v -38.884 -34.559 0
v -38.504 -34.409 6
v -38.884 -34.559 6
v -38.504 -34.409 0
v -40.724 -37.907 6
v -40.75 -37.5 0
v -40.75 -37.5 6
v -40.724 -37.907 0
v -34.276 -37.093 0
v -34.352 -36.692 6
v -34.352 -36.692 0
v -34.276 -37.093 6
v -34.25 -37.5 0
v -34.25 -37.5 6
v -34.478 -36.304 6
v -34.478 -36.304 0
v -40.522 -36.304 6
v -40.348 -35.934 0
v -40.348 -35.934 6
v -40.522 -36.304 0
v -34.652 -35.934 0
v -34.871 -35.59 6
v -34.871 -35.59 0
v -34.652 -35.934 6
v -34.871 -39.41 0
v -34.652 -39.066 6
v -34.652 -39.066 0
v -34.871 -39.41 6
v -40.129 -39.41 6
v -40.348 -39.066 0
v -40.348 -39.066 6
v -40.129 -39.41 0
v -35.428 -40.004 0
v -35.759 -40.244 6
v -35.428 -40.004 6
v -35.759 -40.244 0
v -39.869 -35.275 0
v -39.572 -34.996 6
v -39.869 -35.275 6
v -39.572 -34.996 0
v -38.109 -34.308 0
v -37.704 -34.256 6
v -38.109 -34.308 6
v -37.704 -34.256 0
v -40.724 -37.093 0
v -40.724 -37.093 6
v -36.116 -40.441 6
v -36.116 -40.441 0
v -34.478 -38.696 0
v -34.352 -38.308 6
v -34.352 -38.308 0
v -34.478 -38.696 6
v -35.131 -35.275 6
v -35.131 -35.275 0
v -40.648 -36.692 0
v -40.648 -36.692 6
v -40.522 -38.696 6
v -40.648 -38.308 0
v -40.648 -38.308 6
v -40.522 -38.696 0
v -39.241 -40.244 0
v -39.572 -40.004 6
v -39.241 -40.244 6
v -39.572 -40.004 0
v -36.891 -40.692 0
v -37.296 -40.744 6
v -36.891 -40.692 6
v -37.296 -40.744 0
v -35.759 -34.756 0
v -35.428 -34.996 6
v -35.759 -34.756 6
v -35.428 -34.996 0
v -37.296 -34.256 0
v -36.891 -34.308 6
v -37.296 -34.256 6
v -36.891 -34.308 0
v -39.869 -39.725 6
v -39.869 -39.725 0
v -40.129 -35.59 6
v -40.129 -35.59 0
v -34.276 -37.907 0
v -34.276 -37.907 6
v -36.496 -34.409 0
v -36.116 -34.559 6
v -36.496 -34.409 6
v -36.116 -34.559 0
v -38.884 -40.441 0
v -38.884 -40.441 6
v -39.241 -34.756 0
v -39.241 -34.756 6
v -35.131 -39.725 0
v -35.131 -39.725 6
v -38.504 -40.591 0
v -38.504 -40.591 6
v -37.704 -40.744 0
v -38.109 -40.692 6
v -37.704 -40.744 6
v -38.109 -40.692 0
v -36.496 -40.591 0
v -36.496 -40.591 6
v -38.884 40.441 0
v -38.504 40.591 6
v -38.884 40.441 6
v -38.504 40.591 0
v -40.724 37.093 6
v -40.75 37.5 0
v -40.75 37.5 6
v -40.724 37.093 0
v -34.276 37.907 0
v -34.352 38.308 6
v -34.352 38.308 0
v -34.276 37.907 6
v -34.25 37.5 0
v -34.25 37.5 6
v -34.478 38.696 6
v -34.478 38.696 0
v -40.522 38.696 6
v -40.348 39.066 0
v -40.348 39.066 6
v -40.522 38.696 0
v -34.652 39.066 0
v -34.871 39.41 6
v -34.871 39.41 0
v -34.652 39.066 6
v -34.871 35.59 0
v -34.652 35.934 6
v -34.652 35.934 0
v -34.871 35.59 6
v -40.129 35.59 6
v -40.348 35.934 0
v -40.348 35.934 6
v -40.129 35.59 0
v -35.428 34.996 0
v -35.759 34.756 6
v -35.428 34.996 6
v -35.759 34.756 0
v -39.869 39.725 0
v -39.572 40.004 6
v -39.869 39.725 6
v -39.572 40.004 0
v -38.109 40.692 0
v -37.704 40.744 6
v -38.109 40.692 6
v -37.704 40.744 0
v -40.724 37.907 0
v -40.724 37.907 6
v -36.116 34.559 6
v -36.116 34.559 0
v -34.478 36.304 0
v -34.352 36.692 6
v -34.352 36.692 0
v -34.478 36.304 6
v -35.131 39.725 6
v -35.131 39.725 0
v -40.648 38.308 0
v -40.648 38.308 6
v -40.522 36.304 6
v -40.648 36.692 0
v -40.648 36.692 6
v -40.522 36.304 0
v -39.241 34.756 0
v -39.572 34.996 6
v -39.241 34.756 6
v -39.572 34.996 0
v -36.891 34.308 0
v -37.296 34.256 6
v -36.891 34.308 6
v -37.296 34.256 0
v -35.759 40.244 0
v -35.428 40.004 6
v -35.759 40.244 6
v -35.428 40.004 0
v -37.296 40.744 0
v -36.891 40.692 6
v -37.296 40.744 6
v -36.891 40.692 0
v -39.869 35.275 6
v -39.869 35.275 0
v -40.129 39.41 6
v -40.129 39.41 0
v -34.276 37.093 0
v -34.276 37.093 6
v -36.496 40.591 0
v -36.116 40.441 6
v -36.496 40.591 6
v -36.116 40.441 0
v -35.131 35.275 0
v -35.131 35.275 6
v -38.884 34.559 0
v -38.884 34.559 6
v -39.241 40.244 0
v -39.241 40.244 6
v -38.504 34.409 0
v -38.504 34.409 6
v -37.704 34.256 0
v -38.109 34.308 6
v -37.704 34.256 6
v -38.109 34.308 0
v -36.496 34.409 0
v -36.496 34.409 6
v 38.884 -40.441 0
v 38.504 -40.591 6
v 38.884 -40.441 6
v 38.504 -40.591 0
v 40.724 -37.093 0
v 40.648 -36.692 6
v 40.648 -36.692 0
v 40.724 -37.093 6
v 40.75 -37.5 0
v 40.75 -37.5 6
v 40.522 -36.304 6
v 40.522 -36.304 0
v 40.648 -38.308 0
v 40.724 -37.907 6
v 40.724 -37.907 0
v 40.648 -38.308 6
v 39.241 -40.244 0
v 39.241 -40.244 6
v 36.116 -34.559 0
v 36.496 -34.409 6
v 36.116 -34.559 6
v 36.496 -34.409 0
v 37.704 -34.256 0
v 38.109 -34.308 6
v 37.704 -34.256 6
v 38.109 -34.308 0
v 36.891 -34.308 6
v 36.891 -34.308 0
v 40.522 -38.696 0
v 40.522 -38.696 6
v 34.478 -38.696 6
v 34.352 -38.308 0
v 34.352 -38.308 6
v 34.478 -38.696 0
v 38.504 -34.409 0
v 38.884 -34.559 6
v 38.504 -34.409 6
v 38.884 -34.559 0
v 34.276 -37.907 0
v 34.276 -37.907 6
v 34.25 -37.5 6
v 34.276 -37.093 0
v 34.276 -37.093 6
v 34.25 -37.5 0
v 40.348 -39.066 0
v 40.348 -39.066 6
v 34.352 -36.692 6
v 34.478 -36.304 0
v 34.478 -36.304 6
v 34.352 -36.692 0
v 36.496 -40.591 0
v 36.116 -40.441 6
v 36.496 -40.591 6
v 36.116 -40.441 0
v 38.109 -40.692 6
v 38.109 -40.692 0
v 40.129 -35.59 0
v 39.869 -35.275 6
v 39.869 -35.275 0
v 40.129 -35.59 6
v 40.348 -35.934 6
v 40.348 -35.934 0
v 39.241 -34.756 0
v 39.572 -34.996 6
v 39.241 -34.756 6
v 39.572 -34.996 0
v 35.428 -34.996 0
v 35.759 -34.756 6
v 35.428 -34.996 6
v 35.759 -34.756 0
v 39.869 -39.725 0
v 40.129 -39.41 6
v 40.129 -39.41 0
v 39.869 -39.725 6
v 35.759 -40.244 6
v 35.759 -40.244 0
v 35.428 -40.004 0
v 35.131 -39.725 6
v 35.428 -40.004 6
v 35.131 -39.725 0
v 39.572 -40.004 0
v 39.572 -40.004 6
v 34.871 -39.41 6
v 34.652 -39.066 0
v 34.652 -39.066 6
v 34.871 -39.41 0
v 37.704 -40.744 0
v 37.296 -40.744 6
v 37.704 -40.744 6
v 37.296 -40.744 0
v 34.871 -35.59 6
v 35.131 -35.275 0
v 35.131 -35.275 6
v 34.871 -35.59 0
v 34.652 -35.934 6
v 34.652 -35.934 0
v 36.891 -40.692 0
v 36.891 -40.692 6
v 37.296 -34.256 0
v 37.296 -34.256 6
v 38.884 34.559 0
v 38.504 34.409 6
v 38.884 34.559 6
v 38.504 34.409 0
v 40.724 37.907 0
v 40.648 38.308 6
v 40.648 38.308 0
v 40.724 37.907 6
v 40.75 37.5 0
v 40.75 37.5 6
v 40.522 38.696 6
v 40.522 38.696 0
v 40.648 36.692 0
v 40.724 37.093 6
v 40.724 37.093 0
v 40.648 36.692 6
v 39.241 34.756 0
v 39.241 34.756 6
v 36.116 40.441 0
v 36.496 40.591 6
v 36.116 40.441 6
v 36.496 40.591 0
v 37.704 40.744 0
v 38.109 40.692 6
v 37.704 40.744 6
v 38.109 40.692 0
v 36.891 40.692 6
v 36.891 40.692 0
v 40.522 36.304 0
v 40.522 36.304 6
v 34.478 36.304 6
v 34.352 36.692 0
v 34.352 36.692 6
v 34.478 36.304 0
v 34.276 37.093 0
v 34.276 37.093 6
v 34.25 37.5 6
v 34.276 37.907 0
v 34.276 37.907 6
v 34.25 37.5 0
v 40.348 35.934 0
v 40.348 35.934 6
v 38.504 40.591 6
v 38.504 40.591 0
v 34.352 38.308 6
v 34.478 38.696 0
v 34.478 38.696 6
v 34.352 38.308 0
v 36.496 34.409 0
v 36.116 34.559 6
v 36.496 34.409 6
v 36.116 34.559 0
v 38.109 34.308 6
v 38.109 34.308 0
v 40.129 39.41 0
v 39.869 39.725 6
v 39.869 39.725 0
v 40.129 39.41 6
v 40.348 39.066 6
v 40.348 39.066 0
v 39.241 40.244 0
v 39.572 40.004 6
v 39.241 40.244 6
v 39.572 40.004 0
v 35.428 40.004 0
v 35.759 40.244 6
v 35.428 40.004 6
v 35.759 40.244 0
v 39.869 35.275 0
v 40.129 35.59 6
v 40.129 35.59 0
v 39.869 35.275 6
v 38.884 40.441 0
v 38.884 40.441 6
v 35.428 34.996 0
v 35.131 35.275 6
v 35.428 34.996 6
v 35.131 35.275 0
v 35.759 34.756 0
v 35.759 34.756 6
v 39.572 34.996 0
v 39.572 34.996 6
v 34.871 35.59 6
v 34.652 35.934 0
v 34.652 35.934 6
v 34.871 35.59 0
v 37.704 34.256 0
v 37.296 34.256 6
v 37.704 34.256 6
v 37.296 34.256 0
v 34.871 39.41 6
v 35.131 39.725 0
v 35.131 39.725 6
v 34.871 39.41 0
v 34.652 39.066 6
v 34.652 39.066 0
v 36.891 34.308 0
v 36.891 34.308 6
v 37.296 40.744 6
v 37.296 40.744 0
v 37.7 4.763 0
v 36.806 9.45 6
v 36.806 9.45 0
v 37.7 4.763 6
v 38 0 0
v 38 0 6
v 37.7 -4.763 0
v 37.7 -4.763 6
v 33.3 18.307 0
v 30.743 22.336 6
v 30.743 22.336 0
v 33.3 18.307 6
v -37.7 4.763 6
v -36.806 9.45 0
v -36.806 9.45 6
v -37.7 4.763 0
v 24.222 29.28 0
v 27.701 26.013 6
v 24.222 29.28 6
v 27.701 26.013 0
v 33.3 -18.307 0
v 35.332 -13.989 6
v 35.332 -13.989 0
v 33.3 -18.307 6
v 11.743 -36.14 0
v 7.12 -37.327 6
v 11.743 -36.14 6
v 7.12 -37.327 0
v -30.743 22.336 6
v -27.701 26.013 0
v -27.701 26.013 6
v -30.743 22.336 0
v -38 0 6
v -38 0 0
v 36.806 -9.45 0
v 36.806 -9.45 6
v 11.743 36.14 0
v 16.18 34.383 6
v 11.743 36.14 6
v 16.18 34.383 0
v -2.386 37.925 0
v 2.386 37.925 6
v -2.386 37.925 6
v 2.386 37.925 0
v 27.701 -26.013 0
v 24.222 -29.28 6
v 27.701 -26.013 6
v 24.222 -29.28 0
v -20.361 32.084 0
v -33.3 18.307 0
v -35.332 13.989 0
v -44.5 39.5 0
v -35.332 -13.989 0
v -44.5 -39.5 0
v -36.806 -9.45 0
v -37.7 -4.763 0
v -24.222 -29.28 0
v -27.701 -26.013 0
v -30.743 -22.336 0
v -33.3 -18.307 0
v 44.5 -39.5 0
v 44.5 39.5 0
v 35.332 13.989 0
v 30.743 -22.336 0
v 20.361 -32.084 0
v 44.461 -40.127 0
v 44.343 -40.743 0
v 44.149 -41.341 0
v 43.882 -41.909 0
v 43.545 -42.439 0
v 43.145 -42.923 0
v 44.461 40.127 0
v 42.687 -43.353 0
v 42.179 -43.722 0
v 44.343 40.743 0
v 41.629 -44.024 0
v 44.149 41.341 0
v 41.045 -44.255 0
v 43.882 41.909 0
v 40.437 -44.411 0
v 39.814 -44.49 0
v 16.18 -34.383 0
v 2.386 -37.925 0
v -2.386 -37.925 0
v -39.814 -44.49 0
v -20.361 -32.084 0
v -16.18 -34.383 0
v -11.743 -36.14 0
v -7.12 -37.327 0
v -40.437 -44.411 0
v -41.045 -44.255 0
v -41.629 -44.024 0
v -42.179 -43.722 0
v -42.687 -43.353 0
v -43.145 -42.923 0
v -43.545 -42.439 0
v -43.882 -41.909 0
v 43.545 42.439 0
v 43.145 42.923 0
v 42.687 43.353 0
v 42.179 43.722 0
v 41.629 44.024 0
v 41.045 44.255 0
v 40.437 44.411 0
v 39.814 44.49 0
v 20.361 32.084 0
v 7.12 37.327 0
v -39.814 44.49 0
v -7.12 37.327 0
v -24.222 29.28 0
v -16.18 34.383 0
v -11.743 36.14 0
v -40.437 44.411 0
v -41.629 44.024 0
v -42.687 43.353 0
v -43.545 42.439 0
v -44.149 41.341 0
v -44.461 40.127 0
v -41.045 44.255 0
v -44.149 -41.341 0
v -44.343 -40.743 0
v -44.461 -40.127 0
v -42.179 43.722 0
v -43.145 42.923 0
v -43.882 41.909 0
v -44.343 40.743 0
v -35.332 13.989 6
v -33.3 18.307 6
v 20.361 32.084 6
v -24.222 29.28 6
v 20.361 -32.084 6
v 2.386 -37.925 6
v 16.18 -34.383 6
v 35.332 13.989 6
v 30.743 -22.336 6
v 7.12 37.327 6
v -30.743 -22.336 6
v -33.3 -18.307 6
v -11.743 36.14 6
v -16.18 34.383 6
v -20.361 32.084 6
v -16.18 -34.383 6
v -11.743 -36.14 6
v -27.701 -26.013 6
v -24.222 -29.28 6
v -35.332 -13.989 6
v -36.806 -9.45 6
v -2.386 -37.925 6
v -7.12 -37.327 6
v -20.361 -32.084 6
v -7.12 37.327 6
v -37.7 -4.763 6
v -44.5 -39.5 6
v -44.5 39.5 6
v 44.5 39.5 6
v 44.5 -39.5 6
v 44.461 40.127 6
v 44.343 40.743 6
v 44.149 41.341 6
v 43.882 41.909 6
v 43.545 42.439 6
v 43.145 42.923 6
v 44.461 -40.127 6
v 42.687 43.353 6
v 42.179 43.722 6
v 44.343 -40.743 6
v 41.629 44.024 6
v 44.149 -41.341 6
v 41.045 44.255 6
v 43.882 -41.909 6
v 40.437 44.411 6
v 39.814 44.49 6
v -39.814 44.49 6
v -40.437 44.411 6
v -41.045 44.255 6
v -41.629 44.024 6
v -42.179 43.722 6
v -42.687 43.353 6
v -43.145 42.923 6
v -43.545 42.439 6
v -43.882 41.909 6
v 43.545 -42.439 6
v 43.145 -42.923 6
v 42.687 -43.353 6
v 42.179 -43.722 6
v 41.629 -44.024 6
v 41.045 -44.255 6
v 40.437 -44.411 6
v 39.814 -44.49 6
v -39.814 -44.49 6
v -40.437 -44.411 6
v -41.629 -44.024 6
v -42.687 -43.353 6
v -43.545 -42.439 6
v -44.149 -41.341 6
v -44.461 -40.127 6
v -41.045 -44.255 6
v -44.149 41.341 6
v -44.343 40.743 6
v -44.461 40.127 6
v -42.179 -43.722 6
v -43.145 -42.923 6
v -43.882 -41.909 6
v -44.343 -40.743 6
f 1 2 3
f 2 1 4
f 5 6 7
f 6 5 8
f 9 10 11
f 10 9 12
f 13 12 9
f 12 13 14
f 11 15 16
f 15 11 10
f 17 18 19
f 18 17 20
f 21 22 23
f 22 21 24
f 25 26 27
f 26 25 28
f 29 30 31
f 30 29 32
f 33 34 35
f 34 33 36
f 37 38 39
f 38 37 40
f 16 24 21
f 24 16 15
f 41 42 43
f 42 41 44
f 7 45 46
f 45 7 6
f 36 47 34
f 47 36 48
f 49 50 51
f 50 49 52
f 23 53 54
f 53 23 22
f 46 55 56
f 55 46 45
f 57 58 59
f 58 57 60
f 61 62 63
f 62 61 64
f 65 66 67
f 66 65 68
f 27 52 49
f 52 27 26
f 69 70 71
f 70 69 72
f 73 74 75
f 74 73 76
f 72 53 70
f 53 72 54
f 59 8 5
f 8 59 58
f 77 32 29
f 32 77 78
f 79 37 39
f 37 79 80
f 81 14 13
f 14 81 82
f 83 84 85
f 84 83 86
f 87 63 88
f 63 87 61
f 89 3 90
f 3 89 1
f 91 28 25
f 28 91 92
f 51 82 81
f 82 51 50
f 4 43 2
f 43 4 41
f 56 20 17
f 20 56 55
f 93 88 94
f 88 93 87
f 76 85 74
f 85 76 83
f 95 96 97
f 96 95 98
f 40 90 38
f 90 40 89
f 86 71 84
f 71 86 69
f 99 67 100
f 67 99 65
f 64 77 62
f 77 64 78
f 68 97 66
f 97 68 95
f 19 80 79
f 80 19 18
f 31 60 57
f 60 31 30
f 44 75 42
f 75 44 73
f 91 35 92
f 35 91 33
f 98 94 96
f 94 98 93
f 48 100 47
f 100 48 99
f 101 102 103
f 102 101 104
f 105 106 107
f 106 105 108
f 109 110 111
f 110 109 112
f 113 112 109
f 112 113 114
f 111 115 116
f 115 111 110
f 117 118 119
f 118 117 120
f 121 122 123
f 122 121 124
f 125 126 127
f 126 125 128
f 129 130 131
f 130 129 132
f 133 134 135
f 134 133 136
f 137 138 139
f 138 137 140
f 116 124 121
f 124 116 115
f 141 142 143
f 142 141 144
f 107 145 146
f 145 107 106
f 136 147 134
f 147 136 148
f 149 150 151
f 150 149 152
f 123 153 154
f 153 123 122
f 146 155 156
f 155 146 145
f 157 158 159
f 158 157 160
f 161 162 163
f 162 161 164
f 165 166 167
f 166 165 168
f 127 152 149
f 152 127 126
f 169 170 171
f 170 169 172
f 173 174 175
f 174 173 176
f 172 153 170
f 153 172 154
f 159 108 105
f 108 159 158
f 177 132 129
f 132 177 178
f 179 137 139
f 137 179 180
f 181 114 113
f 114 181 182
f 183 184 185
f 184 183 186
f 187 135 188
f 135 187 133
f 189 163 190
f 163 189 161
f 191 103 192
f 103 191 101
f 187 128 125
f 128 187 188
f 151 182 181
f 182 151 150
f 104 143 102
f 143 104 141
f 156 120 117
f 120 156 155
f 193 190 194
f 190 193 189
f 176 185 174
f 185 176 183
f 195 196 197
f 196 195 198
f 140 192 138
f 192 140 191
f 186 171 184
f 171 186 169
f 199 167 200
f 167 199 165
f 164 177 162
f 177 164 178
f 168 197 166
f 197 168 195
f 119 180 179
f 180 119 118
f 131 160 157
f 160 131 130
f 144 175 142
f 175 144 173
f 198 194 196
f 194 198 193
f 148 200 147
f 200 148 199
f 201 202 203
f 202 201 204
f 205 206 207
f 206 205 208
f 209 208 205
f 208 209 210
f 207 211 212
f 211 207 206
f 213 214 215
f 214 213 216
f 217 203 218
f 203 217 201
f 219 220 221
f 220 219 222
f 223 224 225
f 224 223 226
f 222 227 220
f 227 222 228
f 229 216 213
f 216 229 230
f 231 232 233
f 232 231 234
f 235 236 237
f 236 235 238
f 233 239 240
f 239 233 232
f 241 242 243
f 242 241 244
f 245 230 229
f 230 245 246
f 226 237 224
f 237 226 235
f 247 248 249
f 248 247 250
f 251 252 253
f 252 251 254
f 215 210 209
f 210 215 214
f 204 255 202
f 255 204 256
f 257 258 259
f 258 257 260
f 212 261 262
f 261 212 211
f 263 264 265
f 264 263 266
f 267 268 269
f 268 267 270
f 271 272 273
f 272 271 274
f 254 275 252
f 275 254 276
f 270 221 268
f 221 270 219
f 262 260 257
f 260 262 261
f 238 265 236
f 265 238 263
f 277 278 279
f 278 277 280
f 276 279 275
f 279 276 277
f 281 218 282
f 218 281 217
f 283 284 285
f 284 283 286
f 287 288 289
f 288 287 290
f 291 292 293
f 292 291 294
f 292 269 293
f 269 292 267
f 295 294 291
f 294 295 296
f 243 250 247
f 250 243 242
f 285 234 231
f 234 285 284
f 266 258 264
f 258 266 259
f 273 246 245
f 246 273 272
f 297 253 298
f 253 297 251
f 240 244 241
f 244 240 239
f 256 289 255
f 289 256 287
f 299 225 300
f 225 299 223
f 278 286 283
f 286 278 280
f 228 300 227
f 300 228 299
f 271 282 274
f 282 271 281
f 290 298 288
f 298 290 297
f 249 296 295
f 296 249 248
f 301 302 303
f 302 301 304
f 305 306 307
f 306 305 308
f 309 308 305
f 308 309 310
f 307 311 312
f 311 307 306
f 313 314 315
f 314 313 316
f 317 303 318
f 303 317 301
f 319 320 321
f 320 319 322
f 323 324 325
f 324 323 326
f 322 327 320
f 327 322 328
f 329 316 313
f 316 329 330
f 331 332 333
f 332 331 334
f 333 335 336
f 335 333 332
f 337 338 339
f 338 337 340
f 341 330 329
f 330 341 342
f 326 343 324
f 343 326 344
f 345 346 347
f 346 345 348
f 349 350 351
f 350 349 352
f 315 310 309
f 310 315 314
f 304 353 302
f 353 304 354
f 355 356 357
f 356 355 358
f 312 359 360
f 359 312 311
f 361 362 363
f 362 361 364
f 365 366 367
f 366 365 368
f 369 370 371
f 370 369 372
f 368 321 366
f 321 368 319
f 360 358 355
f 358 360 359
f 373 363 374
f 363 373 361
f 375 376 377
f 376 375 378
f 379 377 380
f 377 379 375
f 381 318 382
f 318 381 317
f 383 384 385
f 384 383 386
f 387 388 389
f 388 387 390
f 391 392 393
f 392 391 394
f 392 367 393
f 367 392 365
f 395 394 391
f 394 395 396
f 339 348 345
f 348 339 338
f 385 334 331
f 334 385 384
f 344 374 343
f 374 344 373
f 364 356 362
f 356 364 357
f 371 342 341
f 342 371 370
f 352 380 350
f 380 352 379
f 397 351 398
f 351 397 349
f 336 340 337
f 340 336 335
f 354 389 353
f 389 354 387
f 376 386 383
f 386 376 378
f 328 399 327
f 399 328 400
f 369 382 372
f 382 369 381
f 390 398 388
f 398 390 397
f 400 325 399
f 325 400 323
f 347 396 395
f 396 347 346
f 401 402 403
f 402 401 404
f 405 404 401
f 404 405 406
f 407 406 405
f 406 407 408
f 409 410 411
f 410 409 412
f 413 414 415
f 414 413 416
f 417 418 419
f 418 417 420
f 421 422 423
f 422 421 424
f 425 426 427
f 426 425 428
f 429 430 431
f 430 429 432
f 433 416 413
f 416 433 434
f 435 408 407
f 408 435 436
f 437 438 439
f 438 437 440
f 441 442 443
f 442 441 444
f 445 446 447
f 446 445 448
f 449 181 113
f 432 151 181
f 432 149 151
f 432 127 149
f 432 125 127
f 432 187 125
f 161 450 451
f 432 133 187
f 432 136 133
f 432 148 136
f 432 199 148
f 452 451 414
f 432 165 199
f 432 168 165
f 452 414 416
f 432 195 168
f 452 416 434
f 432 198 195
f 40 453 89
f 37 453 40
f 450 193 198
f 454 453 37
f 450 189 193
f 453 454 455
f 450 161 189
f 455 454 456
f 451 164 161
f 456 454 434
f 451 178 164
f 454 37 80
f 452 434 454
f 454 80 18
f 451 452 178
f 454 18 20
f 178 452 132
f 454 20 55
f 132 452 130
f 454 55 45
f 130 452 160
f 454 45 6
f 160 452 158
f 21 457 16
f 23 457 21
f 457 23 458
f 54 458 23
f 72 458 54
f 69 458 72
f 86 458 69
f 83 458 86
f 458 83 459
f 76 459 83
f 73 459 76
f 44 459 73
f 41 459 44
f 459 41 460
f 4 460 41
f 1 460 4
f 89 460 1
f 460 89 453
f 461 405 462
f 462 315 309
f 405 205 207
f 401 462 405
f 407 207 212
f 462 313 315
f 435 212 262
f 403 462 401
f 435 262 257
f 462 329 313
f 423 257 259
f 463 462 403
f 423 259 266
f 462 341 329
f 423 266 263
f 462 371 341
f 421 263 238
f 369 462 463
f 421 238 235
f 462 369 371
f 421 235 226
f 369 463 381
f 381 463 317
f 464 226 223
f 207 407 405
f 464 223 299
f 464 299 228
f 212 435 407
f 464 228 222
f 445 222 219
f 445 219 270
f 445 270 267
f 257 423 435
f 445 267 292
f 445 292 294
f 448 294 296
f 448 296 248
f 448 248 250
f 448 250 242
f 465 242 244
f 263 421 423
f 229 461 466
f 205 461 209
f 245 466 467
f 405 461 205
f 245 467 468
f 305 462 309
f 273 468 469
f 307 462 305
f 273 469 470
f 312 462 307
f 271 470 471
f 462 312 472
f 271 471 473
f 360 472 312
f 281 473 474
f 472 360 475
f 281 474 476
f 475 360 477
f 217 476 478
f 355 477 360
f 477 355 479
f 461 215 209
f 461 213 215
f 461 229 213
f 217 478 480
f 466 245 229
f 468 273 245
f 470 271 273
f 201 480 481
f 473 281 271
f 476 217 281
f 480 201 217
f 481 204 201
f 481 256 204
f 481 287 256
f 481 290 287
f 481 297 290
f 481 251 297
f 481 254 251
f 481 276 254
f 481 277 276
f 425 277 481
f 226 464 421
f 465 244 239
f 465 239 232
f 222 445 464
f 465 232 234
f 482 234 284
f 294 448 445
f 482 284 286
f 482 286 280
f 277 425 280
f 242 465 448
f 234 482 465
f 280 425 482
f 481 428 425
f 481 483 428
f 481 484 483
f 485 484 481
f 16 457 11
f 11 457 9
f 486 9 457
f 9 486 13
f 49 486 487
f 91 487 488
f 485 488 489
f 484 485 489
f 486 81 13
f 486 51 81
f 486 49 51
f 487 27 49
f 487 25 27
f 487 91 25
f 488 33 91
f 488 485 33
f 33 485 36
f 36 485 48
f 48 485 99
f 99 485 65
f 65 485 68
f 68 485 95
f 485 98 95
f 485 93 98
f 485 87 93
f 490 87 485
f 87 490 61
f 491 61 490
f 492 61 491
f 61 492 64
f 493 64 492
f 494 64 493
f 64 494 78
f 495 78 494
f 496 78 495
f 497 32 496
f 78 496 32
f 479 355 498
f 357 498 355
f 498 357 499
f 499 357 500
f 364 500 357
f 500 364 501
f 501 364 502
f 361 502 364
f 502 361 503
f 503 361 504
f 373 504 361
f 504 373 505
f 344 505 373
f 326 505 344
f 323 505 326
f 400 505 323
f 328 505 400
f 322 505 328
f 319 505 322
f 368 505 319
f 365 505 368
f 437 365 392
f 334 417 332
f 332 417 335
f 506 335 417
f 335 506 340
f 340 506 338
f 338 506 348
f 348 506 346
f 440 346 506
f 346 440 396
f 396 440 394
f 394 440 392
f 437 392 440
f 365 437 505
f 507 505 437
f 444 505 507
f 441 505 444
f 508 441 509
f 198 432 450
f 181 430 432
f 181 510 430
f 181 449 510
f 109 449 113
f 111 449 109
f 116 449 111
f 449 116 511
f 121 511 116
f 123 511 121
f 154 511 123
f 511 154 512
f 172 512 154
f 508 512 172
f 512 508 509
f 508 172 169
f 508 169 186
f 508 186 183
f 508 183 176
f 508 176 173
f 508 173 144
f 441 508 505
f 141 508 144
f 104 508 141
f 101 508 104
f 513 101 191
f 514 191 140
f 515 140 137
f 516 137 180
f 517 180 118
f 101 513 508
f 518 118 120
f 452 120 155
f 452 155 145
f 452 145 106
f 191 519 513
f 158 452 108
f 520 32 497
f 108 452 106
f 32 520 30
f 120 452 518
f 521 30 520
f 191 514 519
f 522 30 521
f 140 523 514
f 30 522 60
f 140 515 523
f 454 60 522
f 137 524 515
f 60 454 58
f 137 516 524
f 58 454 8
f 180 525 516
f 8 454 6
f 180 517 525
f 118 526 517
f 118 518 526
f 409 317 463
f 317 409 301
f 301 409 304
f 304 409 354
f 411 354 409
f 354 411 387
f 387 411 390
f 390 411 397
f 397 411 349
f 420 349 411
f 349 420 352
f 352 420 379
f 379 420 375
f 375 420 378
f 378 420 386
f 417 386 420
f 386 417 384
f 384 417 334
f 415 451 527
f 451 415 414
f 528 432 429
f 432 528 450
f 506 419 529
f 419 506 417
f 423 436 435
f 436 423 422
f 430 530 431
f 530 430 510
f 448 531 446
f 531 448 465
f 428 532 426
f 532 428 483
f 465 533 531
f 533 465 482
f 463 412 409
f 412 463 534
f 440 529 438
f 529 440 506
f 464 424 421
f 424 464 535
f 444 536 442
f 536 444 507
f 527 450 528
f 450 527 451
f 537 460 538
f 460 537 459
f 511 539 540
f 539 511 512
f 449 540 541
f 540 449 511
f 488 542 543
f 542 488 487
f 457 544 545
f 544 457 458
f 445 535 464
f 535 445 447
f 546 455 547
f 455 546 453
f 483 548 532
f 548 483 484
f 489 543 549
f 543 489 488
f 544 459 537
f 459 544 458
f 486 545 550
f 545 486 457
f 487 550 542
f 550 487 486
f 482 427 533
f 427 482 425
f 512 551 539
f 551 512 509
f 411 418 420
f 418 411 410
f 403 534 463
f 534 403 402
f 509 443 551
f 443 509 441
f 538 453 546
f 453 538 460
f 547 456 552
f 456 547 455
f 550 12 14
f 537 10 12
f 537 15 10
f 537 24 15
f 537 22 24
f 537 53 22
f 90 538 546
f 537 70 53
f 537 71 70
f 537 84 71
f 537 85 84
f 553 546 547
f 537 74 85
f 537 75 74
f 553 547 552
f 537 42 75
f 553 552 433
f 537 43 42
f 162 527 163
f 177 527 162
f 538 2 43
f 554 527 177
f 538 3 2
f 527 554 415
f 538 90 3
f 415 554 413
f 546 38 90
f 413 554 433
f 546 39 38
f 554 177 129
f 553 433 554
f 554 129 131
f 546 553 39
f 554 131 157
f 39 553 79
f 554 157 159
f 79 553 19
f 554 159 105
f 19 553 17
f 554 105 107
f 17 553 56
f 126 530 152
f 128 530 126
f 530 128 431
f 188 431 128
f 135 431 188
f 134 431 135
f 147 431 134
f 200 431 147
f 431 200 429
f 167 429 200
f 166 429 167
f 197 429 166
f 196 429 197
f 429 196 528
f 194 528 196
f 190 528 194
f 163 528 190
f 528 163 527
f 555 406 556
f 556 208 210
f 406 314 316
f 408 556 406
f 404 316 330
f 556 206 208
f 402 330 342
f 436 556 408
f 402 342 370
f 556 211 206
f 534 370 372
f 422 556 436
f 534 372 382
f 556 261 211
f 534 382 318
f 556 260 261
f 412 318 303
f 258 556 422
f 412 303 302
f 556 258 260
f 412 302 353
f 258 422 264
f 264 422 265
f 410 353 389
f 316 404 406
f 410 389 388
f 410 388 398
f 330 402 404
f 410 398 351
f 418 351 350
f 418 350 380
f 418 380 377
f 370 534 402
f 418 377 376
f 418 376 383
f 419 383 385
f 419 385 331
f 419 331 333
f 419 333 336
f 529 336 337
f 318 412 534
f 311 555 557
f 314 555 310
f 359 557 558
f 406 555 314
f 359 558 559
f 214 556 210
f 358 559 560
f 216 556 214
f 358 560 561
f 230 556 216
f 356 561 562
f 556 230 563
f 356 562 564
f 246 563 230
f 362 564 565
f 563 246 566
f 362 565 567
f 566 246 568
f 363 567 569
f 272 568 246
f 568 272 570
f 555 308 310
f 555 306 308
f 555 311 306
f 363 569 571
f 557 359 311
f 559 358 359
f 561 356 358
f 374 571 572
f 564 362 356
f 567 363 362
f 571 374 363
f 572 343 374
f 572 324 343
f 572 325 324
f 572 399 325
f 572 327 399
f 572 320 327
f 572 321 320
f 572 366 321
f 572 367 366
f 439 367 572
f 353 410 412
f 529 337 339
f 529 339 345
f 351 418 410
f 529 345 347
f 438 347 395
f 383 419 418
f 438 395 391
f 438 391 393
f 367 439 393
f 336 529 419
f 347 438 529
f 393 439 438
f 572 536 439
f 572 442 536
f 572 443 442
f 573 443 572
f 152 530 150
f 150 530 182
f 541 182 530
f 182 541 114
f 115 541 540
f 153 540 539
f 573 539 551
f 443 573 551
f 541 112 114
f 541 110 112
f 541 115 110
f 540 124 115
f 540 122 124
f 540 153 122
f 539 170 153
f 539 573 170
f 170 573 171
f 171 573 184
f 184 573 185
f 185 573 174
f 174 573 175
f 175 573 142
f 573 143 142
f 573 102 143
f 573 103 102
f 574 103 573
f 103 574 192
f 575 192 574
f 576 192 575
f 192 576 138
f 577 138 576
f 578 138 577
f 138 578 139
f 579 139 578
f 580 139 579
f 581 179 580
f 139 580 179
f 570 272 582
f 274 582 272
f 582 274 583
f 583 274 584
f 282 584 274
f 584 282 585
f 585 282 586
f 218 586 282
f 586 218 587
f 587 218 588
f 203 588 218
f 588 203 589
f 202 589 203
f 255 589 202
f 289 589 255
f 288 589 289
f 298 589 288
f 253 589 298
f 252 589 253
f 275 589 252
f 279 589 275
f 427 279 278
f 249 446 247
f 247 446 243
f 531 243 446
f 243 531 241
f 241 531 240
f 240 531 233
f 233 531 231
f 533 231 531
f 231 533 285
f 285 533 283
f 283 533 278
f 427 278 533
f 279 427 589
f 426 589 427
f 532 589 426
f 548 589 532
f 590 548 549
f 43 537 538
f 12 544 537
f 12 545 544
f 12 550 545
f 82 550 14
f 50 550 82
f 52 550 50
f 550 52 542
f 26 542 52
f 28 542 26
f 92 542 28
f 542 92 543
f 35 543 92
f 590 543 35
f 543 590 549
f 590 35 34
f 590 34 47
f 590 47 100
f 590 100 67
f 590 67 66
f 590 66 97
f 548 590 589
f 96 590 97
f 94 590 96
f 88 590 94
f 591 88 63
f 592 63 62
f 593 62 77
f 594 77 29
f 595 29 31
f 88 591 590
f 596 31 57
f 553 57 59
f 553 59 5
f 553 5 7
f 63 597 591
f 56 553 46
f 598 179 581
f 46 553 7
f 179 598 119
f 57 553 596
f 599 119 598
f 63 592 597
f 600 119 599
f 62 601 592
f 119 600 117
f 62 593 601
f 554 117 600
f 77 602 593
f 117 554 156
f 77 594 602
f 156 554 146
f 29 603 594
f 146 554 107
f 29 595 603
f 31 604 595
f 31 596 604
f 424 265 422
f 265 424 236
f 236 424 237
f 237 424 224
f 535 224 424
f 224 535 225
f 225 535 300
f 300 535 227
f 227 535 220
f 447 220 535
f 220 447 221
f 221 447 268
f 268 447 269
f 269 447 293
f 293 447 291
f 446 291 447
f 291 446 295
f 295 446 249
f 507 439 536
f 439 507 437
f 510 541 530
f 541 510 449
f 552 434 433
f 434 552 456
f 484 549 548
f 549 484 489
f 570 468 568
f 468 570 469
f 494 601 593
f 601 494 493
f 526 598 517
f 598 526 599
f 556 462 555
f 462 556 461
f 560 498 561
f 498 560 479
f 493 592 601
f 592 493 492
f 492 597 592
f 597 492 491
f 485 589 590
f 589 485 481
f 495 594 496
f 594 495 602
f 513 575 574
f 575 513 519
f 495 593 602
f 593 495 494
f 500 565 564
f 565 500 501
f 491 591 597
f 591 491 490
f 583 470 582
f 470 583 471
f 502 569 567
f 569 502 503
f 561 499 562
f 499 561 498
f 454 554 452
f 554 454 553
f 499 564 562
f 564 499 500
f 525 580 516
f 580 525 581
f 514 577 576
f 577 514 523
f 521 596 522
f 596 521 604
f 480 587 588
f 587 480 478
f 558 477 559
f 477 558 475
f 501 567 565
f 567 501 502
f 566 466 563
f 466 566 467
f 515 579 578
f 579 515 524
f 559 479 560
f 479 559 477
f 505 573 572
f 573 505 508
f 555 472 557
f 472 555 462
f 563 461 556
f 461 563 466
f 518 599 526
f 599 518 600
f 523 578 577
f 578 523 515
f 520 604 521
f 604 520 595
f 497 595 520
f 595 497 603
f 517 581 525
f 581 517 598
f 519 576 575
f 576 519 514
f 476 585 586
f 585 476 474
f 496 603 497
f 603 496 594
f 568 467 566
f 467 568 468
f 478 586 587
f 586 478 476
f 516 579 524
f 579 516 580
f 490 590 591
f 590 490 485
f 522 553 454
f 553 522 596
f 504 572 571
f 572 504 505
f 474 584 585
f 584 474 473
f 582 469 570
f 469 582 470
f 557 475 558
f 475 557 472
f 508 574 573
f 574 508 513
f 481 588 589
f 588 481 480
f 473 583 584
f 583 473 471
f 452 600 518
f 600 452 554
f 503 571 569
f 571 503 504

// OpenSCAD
$fn = 50;

difference() {
	union() {
		hull() {
			translate(v = [-39.5, 39.5, 0]) {
				cylinder(h = 6, r = 5);
			}
			translate(v = [39.5, 39.5, 0]) {
				cylinder(h = 6, r = 5);
			}
			translate(v = [-39.5, -39.5, 0]) {
				cylinder(h = 6, r = 5);
			}
			translate(v = [39.5, -39.5, 0]) {
				cylinder(h = 6, r = 5);
			}
		}
	}
	union() {
		translate(v = [-37.5, -37.5, -100.0]) {
			cylinder(h = 200, r = 3.25);
		}
		translate(v = [-37.5, 37.5, -100.0]) {
			cylinder(h = 200, r = 3.25);
		}
		translate(v = [37.5, -37.5, -100.0]) {
			cylinder(h = 200, r = 3.25);
		}
		translate(v = [37.5, 37.5, -100.0]) {
			cylinder(h = 200, r = 3.25);
		}
		translate(v = [-37.5, -37.5, -100.0]) {
			cylinder(h = 200, r = 1.8);
		}
		translate(v = [-37.5, 37.5, -100.0]) {
			cylinder(h = 200, r = 1.8);
		}
		translate(v = [37.5, -37.5, -100.0]) {
			cylinder(h = 200, r = 1.8);
		}
		translate(v = [37.5, 37.5, -100.0]) {
			cylinder(h = 200, r = 1.8);
		}
		cylinder(h = 6, r = 38.0);
	}
}
